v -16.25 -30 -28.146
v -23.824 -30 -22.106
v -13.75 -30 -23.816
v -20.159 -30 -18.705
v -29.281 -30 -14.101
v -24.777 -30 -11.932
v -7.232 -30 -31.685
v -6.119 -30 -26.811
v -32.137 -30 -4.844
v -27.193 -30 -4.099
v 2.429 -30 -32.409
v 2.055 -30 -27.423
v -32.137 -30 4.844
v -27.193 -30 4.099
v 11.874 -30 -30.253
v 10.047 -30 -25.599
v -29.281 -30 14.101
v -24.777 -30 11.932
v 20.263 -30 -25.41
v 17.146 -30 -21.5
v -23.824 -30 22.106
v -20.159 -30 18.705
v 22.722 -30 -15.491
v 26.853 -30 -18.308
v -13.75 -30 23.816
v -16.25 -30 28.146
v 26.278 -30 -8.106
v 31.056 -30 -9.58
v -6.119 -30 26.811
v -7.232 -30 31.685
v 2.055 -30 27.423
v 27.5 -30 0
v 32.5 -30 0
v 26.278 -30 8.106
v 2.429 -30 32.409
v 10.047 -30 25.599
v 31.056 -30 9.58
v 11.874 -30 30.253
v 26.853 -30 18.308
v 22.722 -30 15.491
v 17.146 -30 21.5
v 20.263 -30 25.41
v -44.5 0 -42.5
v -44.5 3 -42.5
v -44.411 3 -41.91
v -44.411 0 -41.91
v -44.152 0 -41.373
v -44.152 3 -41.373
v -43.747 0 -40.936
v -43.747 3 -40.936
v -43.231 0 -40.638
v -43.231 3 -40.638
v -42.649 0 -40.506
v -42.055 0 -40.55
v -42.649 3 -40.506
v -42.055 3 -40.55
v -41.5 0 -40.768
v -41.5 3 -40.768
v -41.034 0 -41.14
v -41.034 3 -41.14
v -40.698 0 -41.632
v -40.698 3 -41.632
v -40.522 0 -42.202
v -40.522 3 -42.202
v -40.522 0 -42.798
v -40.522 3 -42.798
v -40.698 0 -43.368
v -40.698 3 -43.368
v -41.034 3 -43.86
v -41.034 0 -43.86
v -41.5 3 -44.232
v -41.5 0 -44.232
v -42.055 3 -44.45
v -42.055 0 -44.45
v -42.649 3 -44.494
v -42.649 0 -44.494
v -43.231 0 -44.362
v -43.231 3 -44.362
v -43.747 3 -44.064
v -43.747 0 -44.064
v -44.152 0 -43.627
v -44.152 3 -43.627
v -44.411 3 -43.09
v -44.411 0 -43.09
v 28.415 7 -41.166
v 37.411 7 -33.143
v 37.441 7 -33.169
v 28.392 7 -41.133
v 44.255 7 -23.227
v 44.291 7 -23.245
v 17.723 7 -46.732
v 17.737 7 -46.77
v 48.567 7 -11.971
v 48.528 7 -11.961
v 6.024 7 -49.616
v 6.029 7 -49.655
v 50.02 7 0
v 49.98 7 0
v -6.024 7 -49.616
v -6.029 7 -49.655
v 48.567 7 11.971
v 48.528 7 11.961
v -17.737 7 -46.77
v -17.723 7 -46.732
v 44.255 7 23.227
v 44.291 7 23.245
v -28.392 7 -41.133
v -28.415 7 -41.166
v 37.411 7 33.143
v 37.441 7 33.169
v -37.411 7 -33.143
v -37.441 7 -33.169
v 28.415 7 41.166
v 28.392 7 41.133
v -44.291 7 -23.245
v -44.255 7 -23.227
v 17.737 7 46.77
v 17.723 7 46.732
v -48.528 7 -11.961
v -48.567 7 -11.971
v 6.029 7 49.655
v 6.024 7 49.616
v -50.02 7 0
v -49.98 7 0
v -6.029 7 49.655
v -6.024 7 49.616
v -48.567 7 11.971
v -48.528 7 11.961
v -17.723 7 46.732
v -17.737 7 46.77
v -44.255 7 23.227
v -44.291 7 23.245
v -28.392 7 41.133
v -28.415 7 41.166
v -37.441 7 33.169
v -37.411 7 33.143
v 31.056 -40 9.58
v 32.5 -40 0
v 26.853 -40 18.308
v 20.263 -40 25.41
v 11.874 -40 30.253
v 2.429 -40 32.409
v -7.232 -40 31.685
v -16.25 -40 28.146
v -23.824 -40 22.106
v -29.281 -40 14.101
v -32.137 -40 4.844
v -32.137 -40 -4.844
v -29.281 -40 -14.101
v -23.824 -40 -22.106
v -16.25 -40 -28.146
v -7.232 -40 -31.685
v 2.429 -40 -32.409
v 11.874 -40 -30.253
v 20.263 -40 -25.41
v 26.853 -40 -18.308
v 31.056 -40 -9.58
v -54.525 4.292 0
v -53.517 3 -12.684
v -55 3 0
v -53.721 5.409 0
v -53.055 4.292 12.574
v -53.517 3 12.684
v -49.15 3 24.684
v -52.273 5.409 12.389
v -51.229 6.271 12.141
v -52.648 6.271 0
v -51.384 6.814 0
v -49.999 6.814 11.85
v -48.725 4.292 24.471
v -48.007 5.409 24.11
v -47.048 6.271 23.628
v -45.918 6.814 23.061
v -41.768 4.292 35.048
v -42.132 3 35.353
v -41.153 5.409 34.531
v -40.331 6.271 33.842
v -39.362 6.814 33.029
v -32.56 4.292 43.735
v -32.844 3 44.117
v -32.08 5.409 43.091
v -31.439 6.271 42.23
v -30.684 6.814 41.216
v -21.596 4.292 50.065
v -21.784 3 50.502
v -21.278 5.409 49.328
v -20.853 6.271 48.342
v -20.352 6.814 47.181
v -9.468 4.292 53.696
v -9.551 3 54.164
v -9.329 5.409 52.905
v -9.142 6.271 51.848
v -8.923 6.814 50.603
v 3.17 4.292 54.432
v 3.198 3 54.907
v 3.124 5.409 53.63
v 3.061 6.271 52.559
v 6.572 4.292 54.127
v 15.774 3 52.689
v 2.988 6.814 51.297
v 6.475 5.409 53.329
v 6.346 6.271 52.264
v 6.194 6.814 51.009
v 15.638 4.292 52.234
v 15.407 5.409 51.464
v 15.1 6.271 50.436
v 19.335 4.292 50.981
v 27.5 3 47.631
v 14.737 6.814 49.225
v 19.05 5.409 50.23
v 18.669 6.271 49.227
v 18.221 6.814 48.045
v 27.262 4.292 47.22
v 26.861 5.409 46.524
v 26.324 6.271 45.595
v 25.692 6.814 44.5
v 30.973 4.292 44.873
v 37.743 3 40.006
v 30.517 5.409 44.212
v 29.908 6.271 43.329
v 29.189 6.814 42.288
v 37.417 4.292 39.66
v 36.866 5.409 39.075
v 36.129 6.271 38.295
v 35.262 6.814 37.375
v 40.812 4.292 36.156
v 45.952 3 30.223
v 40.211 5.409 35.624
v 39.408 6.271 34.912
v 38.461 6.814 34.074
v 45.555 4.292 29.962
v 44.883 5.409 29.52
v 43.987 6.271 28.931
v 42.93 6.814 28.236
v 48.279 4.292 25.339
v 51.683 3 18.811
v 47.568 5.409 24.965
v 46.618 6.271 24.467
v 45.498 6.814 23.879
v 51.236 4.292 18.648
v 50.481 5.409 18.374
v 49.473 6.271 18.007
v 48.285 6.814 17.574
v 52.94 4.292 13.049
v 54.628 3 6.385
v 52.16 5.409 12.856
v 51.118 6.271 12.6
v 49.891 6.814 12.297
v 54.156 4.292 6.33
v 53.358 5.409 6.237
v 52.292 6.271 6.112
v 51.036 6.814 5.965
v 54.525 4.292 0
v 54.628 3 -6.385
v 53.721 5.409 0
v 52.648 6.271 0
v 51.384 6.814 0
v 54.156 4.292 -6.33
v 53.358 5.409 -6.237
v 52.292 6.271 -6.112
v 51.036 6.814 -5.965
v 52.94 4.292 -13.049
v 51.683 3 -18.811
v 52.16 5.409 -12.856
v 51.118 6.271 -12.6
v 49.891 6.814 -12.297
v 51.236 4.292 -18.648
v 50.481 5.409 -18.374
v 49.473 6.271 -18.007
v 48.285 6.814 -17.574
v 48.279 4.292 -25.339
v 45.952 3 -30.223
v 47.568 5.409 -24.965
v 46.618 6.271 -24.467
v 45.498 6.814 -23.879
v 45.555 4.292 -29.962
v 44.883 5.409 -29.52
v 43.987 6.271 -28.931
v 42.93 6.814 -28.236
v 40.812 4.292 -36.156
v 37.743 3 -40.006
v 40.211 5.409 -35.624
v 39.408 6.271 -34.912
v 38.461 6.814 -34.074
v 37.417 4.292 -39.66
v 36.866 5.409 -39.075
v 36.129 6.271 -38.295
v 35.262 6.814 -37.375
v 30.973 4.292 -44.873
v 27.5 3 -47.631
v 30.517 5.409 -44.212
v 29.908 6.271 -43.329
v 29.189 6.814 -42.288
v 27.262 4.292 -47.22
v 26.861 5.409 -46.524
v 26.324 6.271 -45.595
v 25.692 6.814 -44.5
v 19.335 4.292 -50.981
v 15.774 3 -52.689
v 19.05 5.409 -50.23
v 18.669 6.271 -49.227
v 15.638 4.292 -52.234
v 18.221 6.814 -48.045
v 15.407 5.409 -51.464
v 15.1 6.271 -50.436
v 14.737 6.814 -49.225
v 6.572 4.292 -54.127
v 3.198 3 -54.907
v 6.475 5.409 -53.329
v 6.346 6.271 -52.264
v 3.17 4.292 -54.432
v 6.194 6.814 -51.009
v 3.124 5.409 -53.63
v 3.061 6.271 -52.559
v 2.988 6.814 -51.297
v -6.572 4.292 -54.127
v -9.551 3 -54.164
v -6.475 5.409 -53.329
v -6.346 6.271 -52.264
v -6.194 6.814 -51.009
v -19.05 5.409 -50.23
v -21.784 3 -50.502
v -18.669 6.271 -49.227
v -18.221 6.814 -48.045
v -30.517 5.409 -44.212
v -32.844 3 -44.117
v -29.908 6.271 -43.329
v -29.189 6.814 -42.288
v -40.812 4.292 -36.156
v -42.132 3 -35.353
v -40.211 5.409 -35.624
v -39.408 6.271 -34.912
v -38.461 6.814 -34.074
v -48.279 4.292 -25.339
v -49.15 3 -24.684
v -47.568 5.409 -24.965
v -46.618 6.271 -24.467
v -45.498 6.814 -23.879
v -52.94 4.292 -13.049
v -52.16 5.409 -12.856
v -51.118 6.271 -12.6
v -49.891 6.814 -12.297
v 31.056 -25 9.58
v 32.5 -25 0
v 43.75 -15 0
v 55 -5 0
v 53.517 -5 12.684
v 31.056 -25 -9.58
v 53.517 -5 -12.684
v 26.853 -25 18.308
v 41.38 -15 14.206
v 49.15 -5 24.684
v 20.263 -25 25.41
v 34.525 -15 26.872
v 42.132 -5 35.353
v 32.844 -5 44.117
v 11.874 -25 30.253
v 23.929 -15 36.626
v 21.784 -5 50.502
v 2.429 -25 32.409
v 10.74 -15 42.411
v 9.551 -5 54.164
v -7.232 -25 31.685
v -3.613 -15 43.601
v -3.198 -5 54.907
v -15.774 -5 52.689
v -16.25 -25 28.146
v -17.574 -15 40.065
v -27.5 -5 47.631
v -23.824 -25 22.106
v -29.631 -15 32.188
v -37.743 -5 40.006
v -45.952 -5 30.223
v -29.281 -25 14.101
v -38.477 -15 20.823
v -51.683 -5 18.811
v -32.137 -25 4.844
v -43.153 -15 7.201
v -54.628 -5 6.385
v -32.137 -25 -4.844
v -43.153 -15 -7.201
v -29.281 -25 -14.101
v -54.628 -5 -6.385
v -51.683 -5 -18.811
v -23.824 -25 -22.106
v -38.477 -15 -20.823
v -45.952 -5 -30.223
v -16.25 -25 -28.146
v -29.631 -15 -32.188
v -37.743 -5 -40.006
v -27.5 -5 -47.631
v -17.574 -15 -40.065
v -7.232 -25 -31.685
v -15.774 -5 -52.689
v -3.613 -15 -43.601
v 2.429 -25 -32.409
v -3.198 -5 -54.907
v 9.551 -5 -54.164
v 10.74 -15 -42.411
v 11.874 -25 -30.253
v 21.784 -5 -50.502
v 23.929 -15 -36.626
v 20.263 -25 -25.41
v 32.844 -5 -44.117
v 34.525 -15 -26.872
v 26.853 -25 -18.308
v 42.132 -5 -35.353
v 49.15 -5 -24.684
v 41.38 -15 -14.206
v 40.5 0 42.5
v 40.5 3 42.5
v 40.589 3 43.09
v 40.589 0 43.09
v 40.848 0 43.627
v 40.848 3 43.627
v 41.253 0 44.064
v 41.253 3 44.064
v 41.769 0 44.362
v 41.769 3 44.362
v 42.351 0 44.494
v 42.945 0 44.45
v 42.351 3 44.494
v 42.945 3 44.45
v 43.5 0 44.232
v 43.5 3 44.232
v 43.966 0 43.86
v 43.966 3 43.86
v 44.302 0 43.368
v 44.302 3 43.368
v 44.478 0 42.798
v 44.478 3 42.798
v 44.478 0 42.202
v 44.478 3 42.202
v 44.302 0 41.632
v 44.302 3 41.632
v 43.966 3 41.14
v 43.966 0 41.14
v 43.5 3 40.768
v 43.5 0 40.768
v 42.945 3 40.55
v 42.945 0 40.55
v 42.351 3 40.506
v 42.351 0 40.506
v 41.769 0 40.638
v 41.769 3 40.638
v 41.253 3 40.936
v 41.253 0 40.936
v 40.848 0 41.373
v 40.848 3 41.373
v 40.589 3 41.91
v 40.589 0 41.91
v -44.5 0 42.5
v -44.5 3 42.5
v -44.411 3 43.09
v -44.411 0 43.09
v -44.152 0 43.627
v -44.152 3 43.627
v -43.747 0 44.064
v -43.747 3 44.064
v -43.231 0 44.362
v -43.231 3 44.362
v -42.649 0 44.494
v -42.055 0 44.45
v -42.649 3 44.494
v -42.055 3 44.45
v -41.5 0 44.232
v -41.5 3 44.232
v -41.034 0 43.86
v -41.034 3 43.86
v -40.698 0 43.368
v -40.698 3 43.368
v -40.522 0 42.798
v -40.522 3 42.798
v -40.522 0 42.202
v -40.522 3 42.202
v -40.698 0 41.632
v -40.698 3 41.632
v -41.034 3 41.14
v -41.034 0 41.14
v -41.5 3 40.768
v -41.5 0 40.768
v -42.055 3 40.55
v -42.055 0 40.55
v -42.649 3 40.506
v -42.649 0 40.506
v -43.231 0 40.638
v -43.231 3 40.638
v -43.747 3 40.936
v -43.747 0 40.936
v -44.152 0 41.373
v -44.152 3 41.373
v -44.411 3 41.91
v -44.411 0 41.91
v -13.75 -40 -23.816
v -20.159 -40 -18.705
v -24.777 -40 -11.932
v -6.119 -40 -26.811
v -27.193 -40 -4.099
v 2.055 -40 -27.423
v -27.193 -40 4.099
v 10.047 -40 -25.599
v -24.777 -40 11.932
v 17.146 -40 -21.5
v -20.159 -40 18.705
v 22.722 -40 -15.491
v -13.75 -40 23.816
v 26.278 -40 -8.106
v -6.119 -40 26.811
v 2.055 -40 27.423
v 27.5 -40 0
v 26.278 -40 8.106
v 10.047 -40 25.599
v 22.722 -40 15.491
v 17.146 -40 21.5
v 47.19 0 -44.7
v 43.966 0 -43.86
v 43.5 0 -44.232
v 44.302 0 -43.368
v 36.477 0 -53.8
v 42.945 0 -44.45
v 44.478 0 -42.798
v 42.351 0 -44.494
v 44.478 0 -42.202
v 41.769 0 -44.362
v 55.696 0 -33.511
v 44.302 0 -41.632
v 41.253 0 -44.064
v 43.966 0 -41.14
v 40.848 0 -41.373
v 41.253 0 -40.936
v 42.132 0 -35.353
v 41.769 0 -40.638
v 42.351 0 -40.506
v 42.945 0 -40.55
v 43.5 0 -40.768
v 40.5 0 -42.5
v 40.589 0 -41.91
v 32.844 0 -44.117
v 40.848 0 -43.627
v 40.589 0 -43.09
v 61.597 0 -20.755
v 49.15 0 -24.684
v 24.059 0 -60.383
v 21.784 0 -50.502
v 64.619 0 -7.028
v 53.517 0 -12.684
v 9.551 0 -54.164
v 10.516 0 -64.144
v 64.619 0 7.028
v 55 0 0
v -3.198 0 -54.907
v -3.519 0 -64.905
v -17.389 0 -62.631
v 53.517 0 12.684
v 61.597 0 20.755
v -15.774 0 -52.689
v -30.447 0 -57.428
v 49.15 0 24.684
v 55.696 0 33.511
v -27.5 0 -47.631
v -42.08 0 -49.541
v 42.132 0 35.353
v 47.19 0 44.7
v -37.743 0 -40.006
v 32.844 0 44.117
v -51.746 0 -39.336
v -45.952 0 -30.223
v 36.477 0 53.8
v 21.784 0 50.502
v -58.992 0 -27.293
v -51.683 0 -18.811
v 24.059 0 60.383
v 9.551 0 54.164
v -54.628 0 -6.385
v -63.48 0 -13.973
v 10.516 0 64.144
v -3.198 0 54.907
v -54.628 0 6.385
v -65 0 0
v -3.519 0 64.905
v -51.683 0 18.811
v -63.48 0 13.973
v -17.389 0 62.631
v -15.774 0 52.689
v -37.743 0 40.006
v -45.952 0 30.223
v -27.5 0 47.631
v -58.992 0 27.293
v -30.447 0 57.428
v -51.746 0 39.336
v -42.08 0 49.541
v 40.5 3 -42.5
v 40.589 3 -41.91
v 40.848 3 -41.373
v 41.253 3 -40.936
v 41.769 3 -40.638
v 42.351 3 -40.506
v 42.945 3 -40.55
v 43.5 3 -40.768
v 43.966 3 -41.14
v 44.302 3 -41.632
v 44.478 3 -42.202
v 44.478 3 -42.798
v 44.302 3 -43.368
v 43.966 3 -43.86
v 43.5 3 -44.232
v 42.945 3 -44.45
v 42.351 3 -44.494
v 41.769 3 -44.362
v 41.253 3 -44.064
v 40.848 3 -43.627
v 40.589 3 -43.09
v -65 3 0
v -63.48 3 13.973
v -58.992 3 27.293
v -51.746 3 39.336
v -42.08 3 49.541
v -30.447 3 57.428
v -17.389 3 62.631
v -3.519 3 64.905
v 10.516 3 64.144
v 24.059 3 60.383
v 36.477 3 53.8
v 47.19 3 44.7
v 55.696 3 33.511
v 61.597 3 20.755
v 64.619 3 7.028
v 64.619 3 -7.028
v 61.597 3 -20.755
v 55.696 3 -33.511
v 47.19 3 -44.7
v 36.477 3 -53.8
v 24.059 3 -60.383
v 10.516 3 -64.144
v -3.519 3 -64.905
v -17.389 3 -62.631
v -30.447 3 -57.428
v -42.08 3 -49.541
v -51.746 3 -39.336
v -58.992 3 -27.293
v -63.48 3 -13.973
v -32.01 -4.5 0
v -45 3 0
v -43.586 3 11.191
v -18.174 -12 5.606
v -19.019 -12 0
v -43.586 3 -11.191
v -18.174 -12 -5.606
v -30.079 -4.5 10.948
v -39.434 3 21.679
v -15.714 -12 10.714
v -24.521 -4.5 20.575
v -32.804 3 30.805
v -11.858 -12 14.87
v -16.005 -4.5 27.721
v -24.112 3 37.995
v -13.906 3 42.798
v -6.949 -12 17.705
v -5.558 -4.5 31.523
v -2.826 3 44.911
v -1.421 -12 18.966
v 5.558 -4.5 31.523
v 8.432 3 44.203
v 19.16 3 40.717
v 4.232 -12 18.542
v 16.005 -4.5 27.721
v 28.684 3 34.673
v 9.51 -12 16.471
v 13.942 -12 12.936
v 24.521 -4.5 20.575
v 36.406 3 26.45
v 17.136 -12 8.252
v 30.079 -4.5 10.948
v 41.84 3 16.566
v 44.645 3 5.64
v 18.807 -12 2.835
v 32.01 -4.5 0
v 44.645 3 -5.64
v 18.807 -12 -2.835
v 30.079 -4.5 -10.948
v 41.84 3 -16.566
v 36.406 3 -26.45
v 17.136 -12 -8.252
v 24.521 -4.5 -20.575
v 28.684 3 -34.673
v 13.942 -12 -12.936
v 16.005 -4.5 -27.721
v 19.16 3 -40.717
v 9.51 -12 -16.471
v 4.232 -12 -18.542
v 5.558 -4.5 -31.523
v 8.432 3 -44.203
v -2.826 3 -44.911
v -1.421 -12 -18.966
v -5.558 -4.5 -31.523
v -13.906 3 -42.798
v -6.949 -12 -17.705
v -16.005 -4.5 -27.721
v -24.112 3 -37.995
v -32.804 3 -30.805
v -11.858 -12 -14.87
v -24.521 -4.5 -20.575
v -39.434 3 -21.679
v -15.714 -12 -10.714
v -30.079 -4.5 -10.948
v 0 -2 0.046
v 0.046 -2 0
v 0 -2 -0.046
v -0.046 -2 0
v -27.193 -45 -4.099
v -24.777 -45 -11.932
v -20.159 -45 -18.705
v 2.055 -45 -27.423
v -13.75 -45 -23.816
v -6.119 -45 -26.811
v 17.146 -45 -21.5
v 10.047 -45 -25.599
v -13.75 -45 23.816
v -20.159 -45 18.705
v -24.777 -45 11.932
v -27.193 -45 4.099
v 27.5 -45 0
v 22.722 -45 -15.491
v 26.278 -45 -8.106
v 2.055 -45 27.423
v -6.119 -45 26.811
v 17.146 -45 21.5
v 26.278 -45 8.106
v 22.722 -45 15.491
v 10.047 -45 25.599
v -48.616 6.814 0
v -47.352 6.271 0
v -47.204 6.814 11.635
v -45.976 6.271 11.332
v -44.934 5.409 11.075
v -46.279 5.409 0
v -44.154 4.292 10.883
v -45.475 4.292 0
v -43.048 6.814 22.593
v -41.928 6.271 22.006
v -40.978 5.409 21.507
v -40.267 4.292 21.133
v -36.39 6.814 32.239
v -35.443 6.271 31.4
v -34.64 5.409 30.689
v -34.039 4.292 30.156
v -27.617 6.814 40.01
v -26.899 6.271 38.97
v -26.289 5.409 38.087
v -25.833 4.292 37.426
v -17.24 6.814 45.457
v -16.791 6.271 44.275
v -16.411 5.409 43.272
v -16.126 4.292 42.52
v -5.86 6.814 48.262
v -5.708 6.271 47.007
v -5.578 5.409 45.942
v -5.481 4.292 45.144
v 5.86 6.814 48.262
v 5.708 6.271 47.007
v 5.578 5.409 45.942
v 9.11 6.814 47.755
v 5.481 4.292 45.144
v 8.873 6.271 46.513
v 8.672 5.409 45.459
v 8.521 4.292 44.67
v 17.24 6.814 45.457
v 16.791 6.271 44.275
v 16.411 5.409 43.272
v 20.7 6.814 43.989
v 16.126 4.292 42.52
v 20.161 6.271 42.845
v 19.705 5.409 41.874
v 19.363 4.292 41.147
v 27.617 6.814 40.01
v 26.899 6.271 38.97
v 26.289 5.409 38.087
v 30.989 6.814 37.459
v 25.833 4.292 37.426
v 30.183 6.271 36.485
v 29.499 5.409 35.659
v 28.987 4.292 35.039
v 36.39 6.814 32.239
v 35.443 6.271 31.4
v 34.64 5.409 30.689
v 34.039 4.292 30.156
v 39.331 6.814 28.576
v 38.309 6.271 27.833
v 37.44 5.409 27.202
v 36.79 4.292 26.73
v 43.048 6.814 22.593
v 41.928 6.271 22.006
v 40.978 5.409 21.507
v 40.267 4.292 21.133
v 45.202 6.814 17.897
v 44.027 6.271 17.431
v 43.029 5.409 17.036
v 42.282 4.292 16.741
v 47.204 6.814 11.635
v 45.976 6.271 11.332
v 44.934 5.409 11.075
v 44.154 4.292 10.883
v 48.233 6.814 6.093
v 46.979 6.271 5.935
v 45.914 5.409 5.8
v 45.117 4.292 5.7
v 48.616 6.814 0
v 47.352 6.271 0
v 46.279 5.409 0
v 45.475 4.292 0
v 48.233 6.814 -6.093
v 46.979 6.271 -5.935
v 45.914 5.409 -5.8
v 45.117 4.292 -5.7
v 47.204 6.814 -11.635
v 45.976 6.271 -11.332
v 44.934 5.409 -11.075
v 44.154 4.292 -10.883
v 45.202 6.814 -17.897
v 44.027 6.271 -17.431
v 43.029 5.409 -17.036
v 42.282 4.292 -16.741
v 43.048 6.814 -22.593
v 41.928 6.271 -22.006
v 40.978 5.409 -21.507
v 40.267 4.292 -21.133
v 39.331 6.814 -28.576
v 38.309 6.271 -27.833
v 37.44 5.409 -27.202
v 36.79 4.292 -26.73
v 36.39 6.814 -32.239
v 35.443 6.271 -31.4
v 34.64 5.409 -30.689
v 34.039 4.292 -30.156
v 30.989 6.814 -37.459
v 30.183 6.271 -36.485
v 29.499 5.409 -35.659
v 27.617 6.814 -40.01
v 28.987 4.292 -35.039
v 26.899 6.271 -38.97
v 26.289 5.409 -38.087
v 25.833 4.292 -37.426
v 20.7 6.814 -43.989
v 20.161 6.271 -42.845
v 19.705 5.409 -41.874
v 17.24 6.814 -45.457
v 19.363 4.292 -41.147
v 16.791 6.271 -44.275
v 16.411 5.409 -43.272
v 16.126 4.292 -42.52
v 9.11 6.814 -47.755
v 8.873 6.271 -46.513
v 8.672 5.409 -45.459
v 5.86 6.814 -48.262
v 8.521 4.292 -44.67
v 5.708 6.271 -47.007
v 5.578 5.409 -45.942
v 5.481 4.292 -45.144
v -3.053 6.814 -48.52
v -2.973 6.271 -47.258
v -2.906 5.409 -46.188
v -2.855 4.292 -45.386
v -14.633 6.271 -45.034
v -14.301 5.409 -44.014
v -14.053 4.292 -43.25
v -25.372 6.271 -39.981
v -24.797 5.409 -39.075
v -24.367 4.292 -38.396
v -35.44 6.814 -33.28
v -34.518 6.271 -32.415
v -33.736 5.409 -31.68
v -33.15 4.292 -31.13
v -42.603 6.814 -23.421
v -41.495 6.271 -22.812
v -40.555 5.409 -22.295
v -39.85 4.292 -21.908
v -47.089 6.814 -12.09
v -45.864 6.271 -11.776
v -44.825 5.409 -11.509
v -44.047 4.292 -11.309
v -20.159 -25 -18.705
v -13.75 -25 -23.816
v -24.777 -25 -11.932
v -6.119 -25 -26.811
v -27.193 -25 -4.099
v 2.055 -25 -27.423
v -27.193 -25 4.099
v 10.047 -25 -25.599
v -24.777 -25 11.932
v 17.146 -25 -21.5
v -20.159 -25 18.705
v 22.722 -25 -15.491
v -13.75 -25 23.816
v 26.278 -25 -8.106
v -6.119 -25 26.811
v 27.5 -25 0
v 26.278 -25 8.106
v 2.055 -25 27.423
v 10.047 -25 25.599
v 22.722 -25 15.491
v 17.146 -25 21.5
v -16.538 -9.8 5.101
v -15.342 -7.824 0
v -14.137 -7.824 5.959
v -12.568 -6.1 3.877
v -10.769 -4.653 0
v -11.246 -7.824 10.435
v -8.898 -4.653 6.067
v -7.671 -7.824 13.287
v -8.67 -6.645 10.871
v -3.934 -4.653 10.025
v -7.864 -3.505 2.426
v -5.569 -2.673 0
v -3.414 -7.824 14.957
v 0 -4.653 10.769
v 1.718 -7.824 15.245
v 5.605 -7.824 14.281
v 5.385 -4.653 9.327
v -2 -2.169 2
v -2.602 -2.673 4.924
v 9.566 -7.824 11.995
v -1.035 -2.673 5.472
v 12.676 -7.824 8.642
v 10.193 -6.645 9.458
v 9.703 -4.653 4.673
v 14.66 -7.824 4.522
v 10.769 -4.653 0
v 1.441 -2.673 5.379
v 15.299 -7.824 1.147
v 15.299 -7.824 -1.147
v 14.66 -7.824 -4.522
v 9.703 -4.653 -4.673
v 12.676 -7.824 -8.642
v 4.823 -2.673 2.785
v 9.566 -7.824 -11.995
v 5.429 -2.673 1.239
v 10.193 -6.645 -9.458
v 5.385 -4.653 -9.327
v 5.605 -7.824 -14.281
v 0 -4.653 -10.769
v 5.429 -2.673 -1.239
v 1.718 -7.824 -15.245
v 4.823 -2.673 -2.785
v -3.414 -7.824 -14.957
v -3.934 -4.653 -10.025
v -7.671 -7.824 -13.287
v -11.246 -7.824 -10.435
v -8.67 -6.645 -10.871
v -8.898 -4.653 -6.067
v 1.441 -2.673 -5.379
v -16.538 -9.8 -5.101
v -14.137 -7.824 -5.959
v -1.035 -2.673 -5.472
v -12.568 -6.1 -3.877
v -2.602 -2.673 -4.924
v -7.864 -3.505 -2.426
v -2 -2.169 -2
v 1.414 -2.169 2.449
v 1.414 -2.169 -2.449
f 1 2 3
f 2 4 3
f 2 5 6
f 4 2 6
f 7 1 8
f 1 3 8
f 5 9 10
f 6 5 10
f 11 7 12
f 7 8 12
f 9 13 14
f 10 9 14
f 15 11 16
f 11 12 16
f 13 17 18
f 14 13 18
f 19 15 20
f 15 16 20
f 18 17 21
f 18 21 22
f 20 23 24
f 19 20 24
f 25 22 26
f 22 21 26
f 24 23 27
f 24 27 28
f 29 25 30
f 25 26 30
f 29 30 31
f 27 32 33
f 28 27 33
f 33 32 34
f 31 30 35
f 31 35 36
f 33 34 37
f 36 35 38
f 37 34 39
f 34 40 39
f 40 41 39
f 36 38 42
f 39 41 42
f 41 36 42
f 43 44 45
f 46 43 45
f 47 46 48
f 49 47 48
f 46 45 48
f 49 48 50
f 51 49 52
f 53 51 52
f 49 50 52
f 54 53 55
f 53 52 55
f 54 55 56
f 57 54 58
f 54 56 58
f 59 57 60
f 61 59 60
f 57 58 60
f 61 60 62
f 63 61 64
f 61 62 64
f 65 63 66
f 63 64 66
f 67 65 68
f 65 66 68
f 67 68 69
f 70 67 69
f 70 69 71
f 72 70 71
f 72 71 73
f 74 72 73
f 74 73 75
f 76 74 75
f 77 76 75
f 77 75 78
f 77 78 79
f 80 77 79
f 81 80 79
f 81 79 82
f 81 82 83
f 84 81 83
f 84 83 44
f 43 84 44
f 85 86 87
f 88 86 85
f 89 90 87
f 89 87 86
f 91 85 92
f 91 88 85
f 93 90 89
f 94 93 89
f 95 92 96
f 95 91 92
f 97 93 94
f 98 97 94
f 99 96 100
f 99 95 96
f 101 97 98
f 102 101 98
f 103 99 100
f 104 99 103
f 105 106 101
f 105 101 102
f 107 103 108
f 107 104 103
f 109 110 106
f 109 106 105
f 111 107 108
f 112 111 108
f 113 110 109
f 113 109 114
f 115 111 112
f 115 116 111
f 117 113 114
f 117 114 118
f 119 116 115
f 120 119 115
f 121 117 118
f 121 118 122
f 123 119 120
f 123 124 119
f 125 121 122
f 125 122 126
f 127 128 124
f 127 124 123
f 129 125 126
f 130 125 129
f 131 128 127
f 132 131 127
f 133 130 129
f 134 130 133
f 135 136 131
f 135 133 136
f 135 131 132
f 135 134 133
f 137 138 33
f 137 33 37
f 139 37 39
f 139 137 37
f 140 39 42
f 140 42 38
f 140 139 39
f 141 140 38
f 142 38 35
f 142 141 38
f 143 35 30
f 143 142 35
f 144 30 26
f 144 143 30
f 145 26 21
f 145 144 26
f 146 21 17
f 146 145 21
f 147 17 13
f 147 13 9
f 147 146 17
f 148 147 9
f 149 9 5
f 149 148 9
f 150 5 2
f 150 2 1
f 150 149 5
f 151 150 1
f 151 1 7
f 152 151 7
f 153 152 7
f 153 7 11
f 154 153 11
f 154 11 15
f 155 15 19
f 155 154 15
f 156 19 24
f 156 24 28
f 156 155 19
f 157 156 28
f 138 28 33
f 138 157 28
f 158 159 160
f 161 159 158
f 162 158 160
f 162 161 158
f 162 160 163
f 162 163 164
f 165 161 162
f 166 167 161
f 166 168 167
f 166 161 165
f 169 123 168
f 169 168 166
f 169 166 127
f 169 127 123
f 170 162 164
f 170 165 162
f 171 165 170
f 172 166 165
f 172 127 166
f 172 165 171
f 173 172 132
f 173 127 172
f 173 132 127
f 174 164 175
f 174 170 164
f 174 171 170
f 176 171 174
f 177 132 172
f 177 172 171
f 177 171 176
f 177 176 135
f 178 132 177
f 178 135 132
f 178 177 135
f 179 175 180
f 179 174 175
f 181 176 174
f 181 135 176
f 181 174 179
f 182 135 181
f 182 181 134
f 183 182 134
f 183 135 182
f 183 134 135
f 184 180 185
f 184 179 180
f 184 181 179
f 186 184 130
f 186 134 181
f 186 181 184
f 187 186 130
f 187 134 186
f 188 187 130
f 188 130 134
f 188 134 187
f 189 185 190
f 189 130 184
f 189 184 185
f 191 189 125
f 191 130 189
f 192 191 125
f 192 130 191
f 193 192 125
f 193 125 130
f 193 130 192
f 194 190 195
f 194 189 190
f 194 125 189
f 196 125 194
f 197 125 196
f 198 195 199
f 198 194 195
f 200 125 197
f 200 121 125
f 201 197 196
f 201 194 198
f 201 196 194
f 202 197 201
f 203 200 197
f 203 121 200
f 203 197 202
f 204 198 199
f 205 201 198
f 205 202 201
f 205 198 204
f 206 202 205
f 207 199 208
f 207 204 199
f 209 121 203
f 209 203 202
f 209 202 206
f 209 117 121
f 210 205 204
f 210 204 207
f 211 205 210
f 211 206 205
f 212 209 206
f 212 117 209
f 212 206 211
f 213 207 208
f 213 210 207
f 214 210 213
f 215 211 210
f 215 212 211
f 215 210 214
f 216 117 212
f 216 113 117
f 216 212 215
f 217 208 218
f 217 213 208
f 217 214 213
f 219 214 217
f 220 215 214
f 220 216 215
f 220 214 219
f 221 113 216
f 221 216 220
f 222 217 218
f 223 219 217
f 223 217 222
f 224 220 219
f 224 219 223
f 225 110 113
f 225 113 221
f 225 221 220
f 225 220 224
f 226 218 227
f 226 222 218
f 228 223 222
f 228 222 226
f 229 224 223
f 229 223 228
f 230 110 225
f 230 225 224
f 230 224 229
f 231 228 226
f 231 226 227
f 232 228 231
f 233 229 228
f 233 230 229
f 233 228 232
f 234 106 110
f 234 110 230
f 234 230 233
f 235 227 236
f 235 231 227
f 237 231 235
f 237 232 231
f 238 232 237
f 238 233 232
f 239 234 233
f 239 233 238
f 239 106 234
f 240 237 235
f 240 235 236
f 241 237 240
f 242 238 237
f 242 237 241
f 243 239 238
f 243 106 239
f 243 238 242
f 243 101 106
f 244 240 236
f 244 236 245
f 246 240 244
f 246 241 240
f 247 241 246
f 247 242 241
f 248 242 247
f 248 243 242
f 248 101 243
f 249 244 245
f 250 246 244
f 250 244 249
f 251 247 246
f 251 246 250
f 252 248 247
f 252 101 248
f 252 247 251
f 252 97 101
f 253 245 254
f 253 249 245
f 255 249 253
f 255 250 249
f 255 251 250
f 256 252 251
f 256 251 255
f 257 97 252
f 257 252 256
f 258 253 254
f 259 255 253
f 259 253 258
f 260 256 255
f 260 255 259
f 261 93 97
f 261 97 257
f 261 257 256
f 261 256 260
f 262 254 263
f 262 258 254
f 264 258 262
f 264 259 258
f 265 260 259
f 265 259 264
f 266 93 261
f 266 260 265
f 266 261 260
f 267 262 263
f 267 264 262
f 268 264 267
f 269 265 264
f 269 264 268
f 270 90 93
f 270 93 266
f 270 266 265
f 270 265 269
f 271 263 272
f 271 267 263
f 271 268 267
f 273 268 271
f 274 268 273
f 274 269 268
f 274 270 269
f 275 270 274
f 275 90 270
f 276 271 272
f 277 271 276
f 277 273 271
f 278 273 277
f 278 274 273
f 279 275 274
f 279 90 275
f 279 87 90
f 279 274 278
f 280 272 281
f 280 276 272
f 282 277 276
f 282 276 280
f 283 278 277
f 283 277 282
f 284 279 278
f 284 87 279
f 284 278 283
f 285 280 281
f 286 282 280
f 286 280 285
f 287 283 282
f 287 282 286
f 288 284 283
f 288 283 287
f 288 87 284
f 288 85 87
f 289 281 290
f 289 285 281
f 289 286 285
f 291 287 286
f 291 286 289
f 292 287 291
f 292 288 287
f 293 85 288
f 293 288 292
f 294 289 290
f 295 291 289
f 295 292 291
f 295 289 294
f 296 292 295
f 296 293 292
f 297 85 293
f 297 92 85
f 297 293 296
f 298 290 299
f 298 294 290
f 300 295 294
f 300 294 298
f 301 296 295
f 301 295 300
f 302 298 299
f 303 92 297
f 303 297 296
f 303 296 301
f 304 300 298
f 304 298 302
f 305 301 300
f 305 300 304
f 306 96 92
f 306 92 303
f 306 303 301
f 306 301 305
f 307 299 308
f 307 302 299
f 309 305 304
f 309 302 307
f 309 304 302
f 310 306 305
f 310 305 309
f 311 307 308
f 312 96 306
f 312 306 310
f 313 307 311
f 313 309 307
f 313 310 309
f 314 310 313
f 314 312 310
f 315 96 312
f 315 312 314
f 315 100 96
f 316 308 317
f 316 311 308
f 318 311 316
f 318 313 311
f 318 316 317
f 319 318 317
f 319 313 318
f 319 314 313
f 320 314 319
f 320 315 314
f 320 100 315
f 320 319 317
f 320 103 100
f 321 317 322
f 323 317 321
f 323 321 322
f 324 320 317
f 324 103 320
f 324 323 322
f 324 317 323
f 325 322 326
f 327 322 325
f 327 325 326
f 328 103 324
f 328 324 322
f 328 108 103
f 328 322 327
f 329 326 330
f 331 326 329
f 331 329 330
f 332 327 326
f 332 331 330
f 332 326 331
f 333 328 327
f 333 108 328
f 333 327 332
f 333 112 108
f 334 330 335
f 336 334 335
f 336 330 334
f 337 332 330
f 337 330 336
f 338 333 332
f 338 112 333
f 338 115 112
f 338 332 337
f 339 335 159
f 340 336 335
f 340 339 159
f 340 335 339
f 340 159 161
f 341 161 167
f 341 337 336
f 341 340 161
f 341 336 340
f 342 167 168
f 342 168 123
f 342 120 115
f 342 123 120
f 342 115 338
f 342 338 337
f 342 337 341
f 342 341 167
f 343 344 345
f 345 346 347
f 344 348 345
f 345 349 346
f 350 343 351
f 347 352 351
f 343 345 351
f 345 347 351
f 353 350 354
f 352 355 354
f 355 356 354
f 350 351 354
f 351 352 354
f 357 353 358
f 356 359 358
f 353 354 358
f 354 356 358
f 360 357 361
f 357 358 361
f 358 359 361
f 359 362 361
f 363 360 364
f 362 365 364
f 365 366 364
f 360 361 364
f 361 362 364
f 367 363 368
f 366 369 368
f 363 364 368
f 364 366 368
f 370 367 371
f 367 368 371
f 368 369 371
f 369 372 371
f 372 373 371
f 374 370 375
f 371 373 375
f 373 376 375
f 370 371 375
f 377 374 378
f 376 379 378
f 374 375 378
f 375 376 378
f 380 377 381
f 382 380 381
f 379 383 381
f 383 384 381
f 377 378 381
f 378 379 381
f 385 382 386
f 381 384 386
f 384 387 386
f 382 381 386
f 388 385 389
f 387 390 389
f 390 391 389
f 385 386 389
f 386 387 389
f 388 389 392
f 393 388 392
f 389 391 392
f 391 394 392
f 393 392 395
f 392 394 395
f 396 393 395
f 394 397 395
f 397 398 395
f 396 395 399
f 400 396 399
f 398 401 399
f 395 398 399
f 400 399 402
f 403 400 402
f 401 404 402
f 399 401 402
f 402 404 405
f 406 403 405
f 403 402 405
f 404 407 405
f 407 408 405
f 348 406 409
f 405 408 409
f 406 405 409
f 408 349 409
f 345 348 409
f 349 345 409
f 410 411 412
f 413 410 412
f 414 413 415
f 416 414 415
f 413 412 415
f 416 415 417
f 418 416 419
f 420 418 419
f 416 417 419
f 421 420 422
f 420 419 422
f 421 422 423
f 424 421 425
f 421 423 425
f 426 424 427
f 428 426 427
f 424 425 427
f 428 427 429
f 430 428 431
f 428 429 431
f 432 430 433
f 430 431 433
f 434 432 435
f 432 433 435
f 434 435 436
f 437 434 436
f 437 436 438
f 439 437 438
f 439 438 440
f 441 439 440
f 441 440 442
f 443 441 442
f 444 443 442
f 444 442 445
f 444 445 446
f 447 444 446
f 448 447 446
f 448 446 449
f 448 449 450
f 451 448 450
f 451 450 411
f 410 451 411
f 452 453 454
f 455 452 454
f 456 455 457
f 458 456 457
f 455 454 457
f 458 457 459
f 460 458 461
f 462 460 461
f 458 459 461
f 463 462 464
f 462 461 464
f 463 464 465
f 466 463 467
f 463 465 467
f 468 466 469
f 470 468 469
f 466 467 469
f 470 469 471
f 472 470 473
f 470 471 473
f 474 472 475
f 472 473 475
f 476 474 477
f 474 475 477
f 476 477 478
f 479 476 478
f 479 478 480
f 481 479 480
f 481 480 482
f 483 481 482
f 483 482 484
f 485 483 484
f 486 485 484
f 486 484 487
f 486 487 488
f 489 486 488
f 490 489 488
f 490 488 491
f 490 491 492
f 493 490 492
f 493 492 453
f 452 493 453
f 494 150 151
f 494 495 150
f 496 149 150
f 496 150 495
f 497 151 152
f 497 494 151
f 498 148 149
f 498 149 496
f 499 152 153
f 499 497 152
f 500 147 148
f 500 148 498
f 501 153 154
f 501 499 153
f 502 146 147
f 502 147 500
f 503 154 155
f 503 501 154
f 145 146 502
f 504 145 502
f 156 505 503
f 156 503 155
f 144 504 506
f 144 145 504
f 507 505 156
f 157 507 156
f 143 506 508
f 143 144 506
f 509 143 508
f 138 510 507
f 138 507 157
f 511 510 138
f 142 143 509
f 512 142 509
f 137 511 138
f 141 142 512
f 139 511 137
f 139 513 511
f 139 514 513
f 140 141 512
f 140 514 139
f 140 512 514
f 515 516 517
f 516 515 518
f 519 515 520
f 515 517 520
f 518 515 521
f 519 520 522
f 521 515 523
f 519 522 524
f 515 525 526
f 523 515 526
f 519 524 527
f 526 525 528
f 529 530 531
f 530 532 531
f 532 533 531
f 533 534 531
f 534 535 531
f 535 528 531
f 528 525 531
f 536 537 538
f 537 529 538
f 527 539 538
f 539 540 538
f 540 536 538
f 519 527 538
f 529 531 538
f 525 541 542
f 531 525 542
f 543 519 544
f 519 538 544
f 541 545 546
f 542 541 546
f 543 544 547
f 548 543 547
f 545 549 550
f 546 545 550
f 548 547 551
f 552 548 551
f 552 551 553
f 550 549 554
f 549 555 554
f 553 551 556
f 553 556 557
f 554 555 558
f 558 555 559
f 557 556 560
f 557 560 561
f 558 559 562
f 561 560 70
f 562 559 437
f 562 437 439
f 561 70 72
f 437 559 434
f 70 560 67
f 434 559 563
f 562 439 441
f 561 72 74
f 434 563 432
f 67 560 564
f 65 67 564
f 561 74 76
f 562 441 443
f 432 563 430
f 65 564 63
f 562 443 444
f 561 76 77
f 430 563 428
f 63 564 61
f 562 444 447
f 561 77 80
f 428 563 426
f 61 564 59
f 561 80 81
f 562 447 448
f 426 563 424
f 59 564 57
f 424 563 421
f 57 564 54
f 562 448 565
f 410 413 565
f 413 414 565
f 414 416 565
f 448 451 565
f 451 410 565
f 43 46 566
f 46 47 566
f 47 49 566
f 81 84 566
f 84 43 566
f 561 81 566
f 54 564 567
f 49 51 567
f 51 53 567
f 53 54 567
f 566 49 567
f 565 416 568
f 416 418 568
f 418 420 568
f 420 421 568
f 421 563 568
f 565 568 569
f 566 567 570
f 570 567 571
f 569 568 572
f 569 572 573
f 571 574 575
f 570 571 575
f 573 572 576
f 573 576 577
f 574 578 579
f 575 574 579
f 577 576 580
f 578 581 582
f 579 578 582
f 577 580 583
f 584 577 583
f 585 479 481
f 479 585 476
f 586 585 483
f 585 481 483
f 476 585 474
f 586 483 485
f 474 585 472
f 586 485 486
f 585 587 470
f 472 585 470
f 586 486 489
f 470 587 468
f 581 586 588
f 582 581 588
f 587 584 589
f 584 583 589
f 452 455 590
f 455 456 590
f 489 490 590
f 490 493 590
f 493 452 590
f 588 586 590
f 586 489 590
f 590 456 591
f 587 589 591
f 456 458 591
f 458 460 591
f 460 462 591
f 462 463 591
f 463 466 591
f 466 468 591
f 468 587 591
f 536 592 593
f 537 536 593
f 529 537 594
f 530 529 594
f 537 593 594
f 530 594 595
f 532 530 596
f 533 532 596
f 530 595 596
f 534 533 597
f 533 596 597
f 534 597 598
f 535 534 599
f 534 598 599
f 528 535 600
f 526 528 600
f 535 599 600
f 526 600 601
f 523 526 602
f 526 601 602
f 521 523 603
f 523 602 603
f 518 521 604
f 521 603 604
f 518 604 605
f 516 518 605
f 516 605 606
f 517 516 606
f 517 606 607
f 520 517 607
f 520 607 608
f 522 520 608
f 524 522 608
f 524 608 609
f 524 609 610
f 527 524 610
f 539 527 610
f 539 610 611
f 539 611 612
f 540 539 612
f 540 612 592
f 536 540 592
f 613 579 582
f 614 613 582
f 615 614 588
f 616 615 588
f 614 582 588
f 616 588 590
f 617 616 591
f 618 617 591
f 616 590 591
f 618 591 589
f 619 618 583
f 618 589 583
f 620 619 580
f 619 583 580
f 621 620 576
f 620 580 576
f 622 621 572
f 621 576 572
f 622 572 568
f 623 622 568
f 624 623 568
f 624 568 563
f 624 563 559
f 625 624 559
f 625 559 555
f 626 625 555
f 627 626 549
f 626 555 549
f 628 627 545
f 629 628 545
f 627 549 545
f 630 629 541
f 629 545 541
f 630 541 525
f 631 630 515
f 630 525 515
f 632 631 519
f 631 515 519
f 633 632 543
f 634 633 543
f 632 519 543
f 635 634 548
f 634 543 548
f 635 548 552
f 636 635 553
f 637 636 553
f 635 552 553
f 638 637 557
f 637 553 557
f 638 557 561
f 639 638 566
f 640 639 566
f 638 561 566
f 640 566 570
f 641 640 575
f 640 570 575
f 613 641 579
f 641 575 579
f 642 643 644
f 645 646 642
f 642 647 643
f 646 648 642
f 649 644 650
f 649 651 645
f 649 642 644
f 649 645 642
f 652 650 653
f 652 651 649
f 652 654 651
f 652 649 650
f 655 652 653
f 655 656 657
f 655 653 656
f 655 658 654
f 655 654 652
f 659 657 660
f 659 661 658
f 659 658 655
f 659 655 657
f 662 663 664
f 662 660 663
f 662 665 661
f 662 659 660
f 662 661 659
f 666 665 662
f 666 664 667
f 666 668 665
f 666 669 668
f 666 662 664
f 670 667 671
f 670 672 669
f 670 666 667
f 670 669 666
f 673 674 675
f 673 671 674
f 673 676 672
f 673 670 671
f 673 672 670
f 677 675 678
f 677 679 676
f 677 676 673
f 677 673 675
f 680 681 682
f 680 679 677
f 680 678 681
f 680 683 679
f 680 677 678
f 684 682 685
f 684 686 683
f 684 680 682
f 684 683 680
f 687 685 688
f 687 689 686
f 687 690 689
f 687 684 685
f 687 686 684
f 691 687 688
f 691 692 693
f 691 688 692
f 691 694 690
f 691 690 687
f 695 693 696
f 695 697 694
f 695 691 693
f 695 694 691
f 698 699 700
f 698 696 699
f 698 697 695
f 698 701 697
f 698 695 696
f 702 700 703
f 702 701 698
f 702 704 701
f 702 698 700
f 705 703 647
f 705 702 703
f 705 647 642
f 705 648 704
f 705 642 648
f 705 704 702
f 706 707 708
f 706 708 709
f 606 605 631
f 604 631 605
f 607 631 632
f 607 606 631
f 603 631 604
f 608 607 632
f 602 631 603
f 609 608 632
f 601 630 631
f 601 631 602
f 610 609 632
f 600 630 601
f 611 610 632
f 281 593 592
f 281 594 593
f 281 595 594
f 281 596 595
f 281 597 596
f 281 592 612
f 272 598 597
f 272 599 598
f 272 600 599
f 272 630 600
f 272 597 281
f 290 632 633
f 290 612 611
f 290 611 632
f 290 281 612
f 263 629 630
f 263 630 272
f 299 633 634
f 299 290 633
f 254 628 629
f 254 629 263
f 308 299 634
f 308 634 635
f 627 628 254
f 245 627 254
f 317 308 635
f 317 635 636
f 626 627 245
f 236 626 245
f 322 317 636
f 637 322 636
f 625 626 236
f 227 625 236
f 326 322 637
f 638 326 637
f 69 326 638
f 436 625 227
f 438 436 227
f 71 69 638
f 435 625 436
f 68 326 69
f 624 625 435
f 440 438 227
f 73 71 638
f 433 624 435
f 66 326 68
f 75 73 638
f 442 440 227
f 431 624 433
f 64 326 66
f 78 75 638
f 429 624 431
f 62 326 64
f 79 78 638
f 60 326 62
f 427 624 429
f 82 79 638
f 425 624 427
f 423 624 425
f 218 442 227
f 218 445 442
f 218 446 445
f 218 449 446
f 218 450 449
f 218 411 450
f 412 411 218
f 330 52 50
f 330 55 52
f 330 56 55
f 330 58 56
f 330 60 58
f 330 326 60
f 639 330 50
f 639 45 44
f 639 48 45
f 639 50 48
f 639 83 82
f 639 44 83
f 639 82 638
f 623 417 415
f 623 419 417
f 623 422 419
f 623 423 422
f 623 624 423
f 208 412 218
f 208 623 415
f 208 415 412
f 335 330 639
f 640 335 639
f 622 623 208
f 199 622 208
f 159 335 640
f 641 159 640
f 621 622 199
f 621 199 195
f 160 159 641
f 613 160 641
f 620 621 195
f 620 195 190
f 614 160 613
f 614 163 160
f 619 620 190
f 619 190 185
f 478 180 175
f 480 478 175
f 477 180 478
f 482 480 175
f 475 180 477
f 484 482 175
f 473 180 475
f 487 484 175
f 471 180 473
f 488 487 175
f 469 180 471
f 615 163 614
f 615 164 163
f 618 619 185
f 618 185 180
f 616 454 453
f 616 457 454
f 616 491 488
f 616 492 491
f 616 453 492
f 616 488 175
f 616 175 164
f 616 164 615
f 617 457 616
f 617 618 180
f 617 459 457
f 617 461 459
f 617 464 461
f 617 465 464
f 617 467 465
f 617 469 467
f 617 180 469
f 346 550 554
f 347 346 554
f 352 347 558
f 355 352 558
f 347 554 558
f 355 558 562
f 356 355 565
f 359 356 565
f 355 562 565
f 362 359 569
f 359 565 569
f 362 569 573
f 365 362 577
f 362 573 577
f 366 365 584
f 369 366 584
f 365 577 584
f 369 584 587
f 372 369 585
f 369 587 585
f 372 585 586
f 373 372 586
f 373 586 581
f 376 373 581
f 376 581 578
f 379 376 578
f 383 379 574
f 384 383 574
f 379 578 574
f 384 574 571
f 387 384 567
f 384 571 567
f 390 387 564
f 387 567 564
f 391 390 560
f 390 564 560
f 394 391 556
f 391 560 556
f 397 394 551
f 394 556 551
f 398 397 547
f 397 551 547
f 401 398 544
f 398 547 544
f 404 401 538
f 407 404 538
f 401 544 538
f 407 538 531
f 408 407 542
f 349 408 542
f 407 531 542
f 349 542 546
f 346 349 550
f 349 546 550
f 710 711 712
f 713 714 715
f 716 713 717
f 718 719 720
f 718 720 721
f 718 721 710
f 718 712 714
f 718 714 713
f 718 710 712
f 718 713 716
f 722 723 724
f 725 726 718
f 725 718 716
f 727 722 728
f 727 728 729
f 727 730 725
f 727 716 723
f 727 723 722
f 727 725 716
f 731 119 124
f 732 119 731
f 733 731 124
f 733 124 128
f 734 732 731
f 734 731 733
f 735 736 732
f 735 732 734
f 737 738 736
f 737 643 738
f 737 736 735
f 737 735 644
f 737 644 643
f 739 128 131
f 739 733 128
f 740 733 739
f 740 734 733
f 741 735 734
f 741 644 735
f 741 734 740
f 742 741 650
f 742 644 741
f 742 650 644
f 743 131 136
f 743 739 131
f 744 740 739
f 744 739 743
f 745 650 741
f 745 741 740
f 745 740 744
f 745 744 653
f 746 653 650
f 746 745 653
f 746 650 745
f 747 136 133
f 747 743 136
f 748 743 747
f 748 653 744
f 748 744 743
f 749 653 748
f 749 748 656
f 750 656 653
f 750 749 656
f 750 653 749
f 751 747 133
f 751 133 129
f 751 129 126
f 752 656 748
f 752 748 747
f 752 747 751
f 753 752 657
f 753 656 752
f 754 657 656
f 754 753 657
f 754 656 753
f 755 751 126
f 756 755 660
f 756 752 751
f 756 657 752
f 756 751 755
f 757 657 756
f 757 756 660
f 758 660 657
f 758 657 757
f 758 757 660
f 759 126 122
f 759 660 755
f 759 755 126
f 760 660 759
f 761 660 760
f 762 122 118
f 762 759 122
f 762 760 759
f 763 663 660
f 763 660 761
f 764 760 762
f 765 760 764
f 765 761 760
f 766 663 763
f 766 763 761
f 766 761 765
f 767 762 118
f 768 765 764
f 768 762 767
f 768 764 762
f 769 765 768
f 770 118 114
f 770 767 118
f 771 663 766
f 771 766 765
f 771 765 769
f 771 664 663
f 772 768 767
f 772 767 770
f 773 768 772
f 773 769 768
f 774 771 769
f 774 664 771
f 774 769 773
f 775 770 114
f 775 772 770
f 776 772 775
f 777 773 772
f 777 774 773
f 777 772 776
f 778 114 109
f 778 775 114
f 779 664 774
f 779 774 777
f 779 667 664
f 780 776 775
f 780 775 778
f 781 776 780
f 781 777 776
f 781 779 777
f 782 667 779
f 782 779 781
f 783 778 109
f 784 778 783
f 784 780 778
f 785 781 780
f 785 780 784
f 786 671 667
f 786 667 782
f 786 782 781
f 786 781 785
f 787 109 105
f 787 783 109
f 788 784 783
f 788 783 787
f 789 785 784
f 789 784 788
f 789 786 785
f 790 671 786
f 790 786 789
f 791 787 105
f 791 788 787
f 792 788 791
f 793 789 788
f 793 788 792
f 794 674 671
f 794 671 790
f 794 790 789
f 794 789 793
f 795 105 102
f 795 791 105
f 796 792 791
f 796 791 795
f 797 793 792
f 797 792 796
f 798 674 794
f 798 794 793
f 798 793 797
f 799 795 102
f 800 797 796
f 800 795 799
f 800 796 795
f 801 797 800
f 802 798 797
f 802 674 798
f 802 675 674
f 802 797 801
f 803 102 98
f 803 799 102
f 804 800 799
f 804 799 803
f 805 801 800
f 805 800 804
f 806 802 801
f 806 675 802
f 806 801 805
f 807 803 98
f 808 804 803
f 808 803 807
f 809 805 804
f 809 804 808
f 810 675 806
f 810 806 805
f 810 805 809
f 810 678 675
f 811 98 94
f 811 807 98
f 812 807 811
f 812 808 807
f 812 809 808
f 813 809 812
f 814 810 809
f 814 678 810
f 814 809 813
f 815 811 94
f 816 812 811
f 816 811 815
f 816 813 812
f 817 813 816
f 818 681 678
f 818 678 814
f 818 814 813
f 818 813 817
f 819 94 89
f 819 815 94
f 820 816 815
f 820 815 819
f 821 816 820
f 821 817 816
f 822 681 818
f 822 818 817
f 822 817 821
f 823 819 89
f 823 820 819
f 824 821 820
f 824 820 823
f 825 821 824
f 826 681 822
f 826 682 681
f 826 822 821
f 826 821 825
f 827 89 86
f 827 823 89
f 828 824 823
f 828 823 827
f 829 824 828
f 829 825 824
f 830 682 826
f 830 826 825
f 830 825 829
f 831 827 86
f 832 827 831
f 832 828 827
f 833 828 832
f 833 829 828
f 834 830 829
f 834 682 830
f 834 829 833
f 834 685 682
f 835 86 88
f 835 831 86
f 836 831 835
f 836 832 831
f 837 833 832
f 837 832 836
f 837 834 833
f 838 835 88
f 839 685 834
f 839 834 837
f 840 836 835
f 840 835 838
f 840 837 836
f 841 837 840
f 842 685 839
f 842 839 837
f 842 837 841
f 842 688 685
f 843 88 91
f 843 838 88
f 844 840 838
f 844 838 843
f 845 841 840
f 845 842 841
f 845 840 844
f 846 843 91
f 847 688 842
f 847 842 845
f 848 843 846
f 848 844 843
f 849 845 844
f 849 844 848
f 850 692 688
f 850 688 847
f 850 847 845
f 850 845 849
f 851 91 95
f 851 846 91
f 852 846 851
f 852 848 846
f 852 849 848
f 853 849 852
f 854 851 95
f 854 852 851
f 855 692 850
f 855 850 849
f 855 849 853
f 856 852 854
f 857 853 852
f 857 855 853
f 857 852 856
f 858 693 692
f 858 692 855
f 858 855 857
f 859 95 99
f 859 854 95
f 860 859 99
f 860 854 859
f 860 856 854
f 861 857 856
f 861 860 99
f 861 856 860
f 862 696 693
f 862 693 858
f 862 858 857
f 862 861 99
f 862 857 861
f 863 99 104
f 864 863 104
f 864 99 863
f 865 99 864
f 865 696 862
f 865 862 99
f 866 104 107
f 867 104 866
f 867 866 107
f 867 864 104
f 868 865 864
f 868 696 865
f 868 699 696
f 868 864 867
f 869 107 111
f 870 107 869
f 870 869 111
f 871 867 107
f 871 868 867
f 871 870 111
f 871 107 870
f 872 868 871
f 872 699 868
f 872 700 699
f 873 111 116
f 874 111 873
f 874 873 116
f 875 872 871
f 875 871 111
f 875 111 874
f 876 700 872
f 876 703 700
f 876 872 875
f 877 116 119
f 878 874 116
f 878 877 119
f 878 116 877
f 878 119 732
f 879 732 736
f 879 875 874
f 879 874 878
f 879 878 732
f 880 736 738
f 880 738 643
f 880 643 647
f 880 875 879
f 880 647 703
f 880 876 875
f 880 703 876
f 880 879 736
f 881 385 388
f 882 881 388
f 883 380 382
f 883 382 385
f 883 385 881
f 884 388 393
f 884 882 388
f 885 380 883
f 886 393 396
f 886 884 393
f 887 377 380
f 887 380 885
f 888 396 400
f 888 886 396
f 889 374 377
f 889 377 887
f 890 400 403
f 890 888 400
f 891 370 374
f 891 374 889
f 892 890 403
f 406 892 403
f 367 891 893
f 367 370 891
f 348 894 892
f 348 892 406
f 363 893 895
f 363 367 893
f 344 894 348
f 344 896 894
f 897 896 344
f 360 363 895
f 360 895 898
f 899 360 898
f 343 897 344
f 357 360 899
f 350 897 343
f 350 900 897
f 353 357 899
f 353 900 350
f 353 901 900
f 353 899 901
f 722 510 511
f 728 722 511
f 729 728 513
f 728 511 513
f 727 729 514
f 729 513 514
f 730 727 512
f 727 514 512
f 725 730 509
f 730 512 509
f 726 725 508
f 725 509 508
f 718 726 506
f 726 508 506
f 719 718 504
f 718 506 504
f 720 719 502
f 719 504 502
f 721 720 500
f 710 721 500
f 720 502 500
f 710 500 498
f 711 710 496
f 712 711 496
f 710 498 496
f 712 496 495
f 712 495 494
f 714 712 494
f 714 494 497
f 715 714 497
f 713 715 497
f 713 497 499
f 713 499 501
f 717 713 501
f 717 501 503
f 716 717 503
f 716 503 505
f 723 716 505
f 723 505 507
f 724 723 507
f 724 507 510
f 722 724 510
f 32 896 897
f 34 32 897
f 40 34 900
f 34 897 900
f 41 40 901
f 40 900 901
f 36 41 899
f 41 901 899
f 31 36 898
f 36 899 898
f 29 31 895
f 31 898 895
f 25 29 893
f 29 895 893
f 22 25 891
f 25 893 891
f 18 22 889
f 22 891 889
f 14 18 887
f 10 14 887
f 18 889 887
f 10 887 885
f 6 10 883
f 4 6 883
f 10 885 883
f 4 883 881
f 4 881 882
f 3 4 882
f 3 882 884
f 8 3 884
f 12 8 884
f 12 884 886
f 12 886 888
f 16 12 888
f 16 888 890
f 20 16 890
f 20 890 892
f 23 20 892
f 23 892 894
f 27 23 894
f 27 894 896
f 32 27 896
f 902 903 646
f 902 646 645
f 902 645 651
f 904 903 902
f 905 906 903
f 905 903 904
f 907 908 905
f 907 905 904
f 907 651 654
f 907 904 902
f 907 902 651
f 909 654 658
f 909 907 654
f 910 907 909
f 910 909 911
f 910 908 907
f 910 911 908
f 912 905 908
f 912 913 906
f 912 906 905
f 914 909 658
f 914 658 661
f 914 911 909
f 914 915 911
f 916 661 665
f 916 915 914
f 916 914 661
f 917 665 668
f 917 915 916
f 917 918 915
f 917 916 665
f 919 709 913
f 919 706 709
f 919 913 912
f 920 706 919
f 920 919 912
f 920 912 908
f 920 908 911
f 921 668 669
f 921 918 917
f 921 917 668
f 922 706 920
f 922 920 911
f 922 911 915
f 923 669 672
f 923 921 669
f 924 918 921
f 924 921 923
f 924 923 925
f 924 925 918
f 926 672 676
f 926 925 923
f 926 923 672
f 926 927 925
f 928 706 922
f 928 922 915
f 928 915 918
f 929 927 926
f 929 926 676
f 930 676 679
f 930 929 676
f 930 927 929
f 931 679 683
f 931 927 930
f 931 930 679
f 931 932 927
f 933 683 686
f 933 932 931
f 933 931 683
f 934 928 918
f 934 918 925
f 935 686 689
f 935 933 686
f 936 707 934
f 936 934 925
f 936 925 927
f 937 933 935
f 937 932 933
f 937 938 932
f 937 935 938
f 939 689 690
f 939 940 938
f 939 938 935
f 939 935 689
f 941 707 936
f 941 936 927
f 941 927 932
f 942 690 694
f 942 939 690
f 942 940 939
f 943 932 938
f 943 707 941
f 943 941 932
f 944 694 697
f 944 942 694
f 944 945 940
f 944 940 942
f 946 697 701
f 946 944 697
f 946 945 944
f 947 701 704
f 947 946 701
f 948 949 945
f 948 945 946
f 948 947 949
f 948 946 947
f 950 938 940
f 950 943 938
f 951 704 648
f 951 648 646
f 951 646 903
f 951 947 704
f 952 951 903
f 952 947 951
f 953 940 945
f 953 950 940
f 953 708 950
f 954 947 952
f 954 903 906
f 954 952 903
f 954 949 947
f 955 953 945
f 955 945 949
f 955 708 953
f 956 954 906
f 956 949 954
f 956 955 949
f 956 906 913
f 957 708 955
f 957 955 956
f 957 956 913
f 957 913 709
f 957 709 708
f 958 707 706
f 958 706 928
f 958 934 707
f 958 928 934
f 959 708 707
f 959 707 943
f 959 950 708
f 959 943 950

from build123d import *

# Parameters (mm, degrees)
F0_R      = 55
F1_DEPTH  = 25
F2_SIZE2  = 20
F2_SIZE   = 22.5
F3_R      = 27.5
F4_DEPTH  = 20
F6_START  = -5
F5_R      = 32.5
F5_R_2    = 27.5
F6_DEPTH  = 10
F7_R      = 65
F8_DEPTH  = 3
F9_R      = 2
F10_DEPTH = 25
F11_R     = 45
F12_DEPTH = 15
F12_TAPER = 60
F13_DEPTH = 10
F15_R     = 55
F15_R_2   = 45
F16_DEPTH = 4


# Not quite as in the source:
# - a fillet or chamfer that OpenCascade refuses, or shapes differently, is made with other operations: its cross-section is extruded or revolved along the edge and cut away or added


with BuildPart() as f1:
    # F0 (on Front) → F1 (new body)
    with BuildSketch(Plane.XZ):
        Circle(F0_R)
    extrude(amount=F1_DEPTH)

    # F2
    f2_edges = [f1.edges().sort_by_distance(p)[0] for p in [
        (-55, -25, 0),
    ]]
    f2_side = f1.faces().sort_by_distance((0, -25, 0))[0]
    chamfer(f2_edges, length=F2_SIZE, length2=F2_SIZE2, reference=f2_side)

    # F3 (on face) → F4 (join)
    with BuildSketch(Plane.XZ.offset(25)):
        Circle(F3_R)
    extrude(amount=F4_DEPTH)

    # F5 (on face) → F6 (join)
    with BuildSketch(Plane.XZ.offset(45).offset(F6_START)):
        Circle(F5_R)
        Circle(F5_R_2, mode=Mode.SUBTRACT)
    extrude(amount=-F6_DEPTH)

    # F7 (on face) → F8 (join)
    with BuildSketch(Plane(origin=(0, 0, 0), x_dir=(-1, 0, 0), z_dir=(0, 1, 0))):
        Circle(F7_R)
    extrude(amount=F8_DEPTH)

    # F9 (on face) → F10 (cut)
    with BuildSketch(Plane(origin=(0, 3, 0), x_dir=(-1, 0, 0), z_dir=(0, 1, 0))):
        with Locations((-42.5, 42.5)):
            Circle(F9_R)
        with Locations((42.5, 42.5)):
            Circle(F9_R)
        with Locations((42.5, -42.5)):
            Circle(F9_R)
        with Locations((-42.5, -42.5)):
            Circle(F9_R)
    extrude(amount=-F10_DEPTH, mode=Mode.SUBTRACT)

    # F11 (on face) → F12 (cut)
    with BuildSketch(Plane(origin=(0, 3, 0), x_dir=(-1, 0, 0), z_dir=(0, 1, 0))):
        Circle(F11_R)
    extrude(amount=-F12_DEPTH, taper=F12_TAPER, mode=Mode.SUBTRACT)

    # F13 (add): a face of the model
    f13_faces = [f1.faces().sort_by_distance(p)[0] for p in [
        (0, -12, 0),
    ]]
    extrude(f13_faces, amount=F13_DEPTH)

    # F14: fillet of radius 23 on 1 edges, made by hand

    # F14_s1 → F14_t2 (revolve, cut)
    with BuildSketch(Plane.XY):
        with BuildLine():
            ThreePointArc((-19.0192378865, -12), (-10.7693772202, -4.6530100506), (-0.0455719255, -2))
            Line((-0.0455719255, -2), (-19.0192378865, -2))
            Line((-19.0192378865, -2), (-19.0192378865, -12))
        make_face()
    revolve(axis=Axis((0, -2, 0), (0, 1, 0)), mode=Mode.SUBTRACT)

    # F15 (on face) → F16 (join)
    with BuildSketch(Plane(origin=(0, 3, 0), x_dir=(-1, 0, 0), z_dir=(0, 1, 0))):
        Circle(F15_R)
        Circle(F15_R_2, mode=Mode.SUBTRACT)
    extrude(amount=F16_DEPTH)

    # F17: fillet of radius 5.1 on 2 edges, made by hand

    # F17_s1 → F17_t2 (revolve, cut)
    with BuildSketch(Plane.XY):
        with BuildLine():
            ThreePointArc((-55, 3), (-53.2137840453, 5.8761790704), (-50.0200401608, 7))
            Line((-50.0200401608, 7), (-55, 7))
            Line((-55, 7), (-55, 3))
        make_face()
    revolve(axis=Axis((0, 7, 0), (0, 1, 0)), mode=Mode.SUBTRACT)

    # F17_s3 → F17_t4 (revolve, cut)
    with BuildSketch(Plane.XY):
        with BuildLine():
            ThreePointArc((-49.9799598392, 7), (-46.7862159547, 5.8761790704), (-45, 3))
            Line((-45, 3), (-45, 7))
            Line((-45, 7), (-49.9799598392, 7))
        make_face()
    revolve(axis=Axis((0, 7, 0), (0, 1, 0)), mode=Mode.SUBTRACT)


solid = f1.part
